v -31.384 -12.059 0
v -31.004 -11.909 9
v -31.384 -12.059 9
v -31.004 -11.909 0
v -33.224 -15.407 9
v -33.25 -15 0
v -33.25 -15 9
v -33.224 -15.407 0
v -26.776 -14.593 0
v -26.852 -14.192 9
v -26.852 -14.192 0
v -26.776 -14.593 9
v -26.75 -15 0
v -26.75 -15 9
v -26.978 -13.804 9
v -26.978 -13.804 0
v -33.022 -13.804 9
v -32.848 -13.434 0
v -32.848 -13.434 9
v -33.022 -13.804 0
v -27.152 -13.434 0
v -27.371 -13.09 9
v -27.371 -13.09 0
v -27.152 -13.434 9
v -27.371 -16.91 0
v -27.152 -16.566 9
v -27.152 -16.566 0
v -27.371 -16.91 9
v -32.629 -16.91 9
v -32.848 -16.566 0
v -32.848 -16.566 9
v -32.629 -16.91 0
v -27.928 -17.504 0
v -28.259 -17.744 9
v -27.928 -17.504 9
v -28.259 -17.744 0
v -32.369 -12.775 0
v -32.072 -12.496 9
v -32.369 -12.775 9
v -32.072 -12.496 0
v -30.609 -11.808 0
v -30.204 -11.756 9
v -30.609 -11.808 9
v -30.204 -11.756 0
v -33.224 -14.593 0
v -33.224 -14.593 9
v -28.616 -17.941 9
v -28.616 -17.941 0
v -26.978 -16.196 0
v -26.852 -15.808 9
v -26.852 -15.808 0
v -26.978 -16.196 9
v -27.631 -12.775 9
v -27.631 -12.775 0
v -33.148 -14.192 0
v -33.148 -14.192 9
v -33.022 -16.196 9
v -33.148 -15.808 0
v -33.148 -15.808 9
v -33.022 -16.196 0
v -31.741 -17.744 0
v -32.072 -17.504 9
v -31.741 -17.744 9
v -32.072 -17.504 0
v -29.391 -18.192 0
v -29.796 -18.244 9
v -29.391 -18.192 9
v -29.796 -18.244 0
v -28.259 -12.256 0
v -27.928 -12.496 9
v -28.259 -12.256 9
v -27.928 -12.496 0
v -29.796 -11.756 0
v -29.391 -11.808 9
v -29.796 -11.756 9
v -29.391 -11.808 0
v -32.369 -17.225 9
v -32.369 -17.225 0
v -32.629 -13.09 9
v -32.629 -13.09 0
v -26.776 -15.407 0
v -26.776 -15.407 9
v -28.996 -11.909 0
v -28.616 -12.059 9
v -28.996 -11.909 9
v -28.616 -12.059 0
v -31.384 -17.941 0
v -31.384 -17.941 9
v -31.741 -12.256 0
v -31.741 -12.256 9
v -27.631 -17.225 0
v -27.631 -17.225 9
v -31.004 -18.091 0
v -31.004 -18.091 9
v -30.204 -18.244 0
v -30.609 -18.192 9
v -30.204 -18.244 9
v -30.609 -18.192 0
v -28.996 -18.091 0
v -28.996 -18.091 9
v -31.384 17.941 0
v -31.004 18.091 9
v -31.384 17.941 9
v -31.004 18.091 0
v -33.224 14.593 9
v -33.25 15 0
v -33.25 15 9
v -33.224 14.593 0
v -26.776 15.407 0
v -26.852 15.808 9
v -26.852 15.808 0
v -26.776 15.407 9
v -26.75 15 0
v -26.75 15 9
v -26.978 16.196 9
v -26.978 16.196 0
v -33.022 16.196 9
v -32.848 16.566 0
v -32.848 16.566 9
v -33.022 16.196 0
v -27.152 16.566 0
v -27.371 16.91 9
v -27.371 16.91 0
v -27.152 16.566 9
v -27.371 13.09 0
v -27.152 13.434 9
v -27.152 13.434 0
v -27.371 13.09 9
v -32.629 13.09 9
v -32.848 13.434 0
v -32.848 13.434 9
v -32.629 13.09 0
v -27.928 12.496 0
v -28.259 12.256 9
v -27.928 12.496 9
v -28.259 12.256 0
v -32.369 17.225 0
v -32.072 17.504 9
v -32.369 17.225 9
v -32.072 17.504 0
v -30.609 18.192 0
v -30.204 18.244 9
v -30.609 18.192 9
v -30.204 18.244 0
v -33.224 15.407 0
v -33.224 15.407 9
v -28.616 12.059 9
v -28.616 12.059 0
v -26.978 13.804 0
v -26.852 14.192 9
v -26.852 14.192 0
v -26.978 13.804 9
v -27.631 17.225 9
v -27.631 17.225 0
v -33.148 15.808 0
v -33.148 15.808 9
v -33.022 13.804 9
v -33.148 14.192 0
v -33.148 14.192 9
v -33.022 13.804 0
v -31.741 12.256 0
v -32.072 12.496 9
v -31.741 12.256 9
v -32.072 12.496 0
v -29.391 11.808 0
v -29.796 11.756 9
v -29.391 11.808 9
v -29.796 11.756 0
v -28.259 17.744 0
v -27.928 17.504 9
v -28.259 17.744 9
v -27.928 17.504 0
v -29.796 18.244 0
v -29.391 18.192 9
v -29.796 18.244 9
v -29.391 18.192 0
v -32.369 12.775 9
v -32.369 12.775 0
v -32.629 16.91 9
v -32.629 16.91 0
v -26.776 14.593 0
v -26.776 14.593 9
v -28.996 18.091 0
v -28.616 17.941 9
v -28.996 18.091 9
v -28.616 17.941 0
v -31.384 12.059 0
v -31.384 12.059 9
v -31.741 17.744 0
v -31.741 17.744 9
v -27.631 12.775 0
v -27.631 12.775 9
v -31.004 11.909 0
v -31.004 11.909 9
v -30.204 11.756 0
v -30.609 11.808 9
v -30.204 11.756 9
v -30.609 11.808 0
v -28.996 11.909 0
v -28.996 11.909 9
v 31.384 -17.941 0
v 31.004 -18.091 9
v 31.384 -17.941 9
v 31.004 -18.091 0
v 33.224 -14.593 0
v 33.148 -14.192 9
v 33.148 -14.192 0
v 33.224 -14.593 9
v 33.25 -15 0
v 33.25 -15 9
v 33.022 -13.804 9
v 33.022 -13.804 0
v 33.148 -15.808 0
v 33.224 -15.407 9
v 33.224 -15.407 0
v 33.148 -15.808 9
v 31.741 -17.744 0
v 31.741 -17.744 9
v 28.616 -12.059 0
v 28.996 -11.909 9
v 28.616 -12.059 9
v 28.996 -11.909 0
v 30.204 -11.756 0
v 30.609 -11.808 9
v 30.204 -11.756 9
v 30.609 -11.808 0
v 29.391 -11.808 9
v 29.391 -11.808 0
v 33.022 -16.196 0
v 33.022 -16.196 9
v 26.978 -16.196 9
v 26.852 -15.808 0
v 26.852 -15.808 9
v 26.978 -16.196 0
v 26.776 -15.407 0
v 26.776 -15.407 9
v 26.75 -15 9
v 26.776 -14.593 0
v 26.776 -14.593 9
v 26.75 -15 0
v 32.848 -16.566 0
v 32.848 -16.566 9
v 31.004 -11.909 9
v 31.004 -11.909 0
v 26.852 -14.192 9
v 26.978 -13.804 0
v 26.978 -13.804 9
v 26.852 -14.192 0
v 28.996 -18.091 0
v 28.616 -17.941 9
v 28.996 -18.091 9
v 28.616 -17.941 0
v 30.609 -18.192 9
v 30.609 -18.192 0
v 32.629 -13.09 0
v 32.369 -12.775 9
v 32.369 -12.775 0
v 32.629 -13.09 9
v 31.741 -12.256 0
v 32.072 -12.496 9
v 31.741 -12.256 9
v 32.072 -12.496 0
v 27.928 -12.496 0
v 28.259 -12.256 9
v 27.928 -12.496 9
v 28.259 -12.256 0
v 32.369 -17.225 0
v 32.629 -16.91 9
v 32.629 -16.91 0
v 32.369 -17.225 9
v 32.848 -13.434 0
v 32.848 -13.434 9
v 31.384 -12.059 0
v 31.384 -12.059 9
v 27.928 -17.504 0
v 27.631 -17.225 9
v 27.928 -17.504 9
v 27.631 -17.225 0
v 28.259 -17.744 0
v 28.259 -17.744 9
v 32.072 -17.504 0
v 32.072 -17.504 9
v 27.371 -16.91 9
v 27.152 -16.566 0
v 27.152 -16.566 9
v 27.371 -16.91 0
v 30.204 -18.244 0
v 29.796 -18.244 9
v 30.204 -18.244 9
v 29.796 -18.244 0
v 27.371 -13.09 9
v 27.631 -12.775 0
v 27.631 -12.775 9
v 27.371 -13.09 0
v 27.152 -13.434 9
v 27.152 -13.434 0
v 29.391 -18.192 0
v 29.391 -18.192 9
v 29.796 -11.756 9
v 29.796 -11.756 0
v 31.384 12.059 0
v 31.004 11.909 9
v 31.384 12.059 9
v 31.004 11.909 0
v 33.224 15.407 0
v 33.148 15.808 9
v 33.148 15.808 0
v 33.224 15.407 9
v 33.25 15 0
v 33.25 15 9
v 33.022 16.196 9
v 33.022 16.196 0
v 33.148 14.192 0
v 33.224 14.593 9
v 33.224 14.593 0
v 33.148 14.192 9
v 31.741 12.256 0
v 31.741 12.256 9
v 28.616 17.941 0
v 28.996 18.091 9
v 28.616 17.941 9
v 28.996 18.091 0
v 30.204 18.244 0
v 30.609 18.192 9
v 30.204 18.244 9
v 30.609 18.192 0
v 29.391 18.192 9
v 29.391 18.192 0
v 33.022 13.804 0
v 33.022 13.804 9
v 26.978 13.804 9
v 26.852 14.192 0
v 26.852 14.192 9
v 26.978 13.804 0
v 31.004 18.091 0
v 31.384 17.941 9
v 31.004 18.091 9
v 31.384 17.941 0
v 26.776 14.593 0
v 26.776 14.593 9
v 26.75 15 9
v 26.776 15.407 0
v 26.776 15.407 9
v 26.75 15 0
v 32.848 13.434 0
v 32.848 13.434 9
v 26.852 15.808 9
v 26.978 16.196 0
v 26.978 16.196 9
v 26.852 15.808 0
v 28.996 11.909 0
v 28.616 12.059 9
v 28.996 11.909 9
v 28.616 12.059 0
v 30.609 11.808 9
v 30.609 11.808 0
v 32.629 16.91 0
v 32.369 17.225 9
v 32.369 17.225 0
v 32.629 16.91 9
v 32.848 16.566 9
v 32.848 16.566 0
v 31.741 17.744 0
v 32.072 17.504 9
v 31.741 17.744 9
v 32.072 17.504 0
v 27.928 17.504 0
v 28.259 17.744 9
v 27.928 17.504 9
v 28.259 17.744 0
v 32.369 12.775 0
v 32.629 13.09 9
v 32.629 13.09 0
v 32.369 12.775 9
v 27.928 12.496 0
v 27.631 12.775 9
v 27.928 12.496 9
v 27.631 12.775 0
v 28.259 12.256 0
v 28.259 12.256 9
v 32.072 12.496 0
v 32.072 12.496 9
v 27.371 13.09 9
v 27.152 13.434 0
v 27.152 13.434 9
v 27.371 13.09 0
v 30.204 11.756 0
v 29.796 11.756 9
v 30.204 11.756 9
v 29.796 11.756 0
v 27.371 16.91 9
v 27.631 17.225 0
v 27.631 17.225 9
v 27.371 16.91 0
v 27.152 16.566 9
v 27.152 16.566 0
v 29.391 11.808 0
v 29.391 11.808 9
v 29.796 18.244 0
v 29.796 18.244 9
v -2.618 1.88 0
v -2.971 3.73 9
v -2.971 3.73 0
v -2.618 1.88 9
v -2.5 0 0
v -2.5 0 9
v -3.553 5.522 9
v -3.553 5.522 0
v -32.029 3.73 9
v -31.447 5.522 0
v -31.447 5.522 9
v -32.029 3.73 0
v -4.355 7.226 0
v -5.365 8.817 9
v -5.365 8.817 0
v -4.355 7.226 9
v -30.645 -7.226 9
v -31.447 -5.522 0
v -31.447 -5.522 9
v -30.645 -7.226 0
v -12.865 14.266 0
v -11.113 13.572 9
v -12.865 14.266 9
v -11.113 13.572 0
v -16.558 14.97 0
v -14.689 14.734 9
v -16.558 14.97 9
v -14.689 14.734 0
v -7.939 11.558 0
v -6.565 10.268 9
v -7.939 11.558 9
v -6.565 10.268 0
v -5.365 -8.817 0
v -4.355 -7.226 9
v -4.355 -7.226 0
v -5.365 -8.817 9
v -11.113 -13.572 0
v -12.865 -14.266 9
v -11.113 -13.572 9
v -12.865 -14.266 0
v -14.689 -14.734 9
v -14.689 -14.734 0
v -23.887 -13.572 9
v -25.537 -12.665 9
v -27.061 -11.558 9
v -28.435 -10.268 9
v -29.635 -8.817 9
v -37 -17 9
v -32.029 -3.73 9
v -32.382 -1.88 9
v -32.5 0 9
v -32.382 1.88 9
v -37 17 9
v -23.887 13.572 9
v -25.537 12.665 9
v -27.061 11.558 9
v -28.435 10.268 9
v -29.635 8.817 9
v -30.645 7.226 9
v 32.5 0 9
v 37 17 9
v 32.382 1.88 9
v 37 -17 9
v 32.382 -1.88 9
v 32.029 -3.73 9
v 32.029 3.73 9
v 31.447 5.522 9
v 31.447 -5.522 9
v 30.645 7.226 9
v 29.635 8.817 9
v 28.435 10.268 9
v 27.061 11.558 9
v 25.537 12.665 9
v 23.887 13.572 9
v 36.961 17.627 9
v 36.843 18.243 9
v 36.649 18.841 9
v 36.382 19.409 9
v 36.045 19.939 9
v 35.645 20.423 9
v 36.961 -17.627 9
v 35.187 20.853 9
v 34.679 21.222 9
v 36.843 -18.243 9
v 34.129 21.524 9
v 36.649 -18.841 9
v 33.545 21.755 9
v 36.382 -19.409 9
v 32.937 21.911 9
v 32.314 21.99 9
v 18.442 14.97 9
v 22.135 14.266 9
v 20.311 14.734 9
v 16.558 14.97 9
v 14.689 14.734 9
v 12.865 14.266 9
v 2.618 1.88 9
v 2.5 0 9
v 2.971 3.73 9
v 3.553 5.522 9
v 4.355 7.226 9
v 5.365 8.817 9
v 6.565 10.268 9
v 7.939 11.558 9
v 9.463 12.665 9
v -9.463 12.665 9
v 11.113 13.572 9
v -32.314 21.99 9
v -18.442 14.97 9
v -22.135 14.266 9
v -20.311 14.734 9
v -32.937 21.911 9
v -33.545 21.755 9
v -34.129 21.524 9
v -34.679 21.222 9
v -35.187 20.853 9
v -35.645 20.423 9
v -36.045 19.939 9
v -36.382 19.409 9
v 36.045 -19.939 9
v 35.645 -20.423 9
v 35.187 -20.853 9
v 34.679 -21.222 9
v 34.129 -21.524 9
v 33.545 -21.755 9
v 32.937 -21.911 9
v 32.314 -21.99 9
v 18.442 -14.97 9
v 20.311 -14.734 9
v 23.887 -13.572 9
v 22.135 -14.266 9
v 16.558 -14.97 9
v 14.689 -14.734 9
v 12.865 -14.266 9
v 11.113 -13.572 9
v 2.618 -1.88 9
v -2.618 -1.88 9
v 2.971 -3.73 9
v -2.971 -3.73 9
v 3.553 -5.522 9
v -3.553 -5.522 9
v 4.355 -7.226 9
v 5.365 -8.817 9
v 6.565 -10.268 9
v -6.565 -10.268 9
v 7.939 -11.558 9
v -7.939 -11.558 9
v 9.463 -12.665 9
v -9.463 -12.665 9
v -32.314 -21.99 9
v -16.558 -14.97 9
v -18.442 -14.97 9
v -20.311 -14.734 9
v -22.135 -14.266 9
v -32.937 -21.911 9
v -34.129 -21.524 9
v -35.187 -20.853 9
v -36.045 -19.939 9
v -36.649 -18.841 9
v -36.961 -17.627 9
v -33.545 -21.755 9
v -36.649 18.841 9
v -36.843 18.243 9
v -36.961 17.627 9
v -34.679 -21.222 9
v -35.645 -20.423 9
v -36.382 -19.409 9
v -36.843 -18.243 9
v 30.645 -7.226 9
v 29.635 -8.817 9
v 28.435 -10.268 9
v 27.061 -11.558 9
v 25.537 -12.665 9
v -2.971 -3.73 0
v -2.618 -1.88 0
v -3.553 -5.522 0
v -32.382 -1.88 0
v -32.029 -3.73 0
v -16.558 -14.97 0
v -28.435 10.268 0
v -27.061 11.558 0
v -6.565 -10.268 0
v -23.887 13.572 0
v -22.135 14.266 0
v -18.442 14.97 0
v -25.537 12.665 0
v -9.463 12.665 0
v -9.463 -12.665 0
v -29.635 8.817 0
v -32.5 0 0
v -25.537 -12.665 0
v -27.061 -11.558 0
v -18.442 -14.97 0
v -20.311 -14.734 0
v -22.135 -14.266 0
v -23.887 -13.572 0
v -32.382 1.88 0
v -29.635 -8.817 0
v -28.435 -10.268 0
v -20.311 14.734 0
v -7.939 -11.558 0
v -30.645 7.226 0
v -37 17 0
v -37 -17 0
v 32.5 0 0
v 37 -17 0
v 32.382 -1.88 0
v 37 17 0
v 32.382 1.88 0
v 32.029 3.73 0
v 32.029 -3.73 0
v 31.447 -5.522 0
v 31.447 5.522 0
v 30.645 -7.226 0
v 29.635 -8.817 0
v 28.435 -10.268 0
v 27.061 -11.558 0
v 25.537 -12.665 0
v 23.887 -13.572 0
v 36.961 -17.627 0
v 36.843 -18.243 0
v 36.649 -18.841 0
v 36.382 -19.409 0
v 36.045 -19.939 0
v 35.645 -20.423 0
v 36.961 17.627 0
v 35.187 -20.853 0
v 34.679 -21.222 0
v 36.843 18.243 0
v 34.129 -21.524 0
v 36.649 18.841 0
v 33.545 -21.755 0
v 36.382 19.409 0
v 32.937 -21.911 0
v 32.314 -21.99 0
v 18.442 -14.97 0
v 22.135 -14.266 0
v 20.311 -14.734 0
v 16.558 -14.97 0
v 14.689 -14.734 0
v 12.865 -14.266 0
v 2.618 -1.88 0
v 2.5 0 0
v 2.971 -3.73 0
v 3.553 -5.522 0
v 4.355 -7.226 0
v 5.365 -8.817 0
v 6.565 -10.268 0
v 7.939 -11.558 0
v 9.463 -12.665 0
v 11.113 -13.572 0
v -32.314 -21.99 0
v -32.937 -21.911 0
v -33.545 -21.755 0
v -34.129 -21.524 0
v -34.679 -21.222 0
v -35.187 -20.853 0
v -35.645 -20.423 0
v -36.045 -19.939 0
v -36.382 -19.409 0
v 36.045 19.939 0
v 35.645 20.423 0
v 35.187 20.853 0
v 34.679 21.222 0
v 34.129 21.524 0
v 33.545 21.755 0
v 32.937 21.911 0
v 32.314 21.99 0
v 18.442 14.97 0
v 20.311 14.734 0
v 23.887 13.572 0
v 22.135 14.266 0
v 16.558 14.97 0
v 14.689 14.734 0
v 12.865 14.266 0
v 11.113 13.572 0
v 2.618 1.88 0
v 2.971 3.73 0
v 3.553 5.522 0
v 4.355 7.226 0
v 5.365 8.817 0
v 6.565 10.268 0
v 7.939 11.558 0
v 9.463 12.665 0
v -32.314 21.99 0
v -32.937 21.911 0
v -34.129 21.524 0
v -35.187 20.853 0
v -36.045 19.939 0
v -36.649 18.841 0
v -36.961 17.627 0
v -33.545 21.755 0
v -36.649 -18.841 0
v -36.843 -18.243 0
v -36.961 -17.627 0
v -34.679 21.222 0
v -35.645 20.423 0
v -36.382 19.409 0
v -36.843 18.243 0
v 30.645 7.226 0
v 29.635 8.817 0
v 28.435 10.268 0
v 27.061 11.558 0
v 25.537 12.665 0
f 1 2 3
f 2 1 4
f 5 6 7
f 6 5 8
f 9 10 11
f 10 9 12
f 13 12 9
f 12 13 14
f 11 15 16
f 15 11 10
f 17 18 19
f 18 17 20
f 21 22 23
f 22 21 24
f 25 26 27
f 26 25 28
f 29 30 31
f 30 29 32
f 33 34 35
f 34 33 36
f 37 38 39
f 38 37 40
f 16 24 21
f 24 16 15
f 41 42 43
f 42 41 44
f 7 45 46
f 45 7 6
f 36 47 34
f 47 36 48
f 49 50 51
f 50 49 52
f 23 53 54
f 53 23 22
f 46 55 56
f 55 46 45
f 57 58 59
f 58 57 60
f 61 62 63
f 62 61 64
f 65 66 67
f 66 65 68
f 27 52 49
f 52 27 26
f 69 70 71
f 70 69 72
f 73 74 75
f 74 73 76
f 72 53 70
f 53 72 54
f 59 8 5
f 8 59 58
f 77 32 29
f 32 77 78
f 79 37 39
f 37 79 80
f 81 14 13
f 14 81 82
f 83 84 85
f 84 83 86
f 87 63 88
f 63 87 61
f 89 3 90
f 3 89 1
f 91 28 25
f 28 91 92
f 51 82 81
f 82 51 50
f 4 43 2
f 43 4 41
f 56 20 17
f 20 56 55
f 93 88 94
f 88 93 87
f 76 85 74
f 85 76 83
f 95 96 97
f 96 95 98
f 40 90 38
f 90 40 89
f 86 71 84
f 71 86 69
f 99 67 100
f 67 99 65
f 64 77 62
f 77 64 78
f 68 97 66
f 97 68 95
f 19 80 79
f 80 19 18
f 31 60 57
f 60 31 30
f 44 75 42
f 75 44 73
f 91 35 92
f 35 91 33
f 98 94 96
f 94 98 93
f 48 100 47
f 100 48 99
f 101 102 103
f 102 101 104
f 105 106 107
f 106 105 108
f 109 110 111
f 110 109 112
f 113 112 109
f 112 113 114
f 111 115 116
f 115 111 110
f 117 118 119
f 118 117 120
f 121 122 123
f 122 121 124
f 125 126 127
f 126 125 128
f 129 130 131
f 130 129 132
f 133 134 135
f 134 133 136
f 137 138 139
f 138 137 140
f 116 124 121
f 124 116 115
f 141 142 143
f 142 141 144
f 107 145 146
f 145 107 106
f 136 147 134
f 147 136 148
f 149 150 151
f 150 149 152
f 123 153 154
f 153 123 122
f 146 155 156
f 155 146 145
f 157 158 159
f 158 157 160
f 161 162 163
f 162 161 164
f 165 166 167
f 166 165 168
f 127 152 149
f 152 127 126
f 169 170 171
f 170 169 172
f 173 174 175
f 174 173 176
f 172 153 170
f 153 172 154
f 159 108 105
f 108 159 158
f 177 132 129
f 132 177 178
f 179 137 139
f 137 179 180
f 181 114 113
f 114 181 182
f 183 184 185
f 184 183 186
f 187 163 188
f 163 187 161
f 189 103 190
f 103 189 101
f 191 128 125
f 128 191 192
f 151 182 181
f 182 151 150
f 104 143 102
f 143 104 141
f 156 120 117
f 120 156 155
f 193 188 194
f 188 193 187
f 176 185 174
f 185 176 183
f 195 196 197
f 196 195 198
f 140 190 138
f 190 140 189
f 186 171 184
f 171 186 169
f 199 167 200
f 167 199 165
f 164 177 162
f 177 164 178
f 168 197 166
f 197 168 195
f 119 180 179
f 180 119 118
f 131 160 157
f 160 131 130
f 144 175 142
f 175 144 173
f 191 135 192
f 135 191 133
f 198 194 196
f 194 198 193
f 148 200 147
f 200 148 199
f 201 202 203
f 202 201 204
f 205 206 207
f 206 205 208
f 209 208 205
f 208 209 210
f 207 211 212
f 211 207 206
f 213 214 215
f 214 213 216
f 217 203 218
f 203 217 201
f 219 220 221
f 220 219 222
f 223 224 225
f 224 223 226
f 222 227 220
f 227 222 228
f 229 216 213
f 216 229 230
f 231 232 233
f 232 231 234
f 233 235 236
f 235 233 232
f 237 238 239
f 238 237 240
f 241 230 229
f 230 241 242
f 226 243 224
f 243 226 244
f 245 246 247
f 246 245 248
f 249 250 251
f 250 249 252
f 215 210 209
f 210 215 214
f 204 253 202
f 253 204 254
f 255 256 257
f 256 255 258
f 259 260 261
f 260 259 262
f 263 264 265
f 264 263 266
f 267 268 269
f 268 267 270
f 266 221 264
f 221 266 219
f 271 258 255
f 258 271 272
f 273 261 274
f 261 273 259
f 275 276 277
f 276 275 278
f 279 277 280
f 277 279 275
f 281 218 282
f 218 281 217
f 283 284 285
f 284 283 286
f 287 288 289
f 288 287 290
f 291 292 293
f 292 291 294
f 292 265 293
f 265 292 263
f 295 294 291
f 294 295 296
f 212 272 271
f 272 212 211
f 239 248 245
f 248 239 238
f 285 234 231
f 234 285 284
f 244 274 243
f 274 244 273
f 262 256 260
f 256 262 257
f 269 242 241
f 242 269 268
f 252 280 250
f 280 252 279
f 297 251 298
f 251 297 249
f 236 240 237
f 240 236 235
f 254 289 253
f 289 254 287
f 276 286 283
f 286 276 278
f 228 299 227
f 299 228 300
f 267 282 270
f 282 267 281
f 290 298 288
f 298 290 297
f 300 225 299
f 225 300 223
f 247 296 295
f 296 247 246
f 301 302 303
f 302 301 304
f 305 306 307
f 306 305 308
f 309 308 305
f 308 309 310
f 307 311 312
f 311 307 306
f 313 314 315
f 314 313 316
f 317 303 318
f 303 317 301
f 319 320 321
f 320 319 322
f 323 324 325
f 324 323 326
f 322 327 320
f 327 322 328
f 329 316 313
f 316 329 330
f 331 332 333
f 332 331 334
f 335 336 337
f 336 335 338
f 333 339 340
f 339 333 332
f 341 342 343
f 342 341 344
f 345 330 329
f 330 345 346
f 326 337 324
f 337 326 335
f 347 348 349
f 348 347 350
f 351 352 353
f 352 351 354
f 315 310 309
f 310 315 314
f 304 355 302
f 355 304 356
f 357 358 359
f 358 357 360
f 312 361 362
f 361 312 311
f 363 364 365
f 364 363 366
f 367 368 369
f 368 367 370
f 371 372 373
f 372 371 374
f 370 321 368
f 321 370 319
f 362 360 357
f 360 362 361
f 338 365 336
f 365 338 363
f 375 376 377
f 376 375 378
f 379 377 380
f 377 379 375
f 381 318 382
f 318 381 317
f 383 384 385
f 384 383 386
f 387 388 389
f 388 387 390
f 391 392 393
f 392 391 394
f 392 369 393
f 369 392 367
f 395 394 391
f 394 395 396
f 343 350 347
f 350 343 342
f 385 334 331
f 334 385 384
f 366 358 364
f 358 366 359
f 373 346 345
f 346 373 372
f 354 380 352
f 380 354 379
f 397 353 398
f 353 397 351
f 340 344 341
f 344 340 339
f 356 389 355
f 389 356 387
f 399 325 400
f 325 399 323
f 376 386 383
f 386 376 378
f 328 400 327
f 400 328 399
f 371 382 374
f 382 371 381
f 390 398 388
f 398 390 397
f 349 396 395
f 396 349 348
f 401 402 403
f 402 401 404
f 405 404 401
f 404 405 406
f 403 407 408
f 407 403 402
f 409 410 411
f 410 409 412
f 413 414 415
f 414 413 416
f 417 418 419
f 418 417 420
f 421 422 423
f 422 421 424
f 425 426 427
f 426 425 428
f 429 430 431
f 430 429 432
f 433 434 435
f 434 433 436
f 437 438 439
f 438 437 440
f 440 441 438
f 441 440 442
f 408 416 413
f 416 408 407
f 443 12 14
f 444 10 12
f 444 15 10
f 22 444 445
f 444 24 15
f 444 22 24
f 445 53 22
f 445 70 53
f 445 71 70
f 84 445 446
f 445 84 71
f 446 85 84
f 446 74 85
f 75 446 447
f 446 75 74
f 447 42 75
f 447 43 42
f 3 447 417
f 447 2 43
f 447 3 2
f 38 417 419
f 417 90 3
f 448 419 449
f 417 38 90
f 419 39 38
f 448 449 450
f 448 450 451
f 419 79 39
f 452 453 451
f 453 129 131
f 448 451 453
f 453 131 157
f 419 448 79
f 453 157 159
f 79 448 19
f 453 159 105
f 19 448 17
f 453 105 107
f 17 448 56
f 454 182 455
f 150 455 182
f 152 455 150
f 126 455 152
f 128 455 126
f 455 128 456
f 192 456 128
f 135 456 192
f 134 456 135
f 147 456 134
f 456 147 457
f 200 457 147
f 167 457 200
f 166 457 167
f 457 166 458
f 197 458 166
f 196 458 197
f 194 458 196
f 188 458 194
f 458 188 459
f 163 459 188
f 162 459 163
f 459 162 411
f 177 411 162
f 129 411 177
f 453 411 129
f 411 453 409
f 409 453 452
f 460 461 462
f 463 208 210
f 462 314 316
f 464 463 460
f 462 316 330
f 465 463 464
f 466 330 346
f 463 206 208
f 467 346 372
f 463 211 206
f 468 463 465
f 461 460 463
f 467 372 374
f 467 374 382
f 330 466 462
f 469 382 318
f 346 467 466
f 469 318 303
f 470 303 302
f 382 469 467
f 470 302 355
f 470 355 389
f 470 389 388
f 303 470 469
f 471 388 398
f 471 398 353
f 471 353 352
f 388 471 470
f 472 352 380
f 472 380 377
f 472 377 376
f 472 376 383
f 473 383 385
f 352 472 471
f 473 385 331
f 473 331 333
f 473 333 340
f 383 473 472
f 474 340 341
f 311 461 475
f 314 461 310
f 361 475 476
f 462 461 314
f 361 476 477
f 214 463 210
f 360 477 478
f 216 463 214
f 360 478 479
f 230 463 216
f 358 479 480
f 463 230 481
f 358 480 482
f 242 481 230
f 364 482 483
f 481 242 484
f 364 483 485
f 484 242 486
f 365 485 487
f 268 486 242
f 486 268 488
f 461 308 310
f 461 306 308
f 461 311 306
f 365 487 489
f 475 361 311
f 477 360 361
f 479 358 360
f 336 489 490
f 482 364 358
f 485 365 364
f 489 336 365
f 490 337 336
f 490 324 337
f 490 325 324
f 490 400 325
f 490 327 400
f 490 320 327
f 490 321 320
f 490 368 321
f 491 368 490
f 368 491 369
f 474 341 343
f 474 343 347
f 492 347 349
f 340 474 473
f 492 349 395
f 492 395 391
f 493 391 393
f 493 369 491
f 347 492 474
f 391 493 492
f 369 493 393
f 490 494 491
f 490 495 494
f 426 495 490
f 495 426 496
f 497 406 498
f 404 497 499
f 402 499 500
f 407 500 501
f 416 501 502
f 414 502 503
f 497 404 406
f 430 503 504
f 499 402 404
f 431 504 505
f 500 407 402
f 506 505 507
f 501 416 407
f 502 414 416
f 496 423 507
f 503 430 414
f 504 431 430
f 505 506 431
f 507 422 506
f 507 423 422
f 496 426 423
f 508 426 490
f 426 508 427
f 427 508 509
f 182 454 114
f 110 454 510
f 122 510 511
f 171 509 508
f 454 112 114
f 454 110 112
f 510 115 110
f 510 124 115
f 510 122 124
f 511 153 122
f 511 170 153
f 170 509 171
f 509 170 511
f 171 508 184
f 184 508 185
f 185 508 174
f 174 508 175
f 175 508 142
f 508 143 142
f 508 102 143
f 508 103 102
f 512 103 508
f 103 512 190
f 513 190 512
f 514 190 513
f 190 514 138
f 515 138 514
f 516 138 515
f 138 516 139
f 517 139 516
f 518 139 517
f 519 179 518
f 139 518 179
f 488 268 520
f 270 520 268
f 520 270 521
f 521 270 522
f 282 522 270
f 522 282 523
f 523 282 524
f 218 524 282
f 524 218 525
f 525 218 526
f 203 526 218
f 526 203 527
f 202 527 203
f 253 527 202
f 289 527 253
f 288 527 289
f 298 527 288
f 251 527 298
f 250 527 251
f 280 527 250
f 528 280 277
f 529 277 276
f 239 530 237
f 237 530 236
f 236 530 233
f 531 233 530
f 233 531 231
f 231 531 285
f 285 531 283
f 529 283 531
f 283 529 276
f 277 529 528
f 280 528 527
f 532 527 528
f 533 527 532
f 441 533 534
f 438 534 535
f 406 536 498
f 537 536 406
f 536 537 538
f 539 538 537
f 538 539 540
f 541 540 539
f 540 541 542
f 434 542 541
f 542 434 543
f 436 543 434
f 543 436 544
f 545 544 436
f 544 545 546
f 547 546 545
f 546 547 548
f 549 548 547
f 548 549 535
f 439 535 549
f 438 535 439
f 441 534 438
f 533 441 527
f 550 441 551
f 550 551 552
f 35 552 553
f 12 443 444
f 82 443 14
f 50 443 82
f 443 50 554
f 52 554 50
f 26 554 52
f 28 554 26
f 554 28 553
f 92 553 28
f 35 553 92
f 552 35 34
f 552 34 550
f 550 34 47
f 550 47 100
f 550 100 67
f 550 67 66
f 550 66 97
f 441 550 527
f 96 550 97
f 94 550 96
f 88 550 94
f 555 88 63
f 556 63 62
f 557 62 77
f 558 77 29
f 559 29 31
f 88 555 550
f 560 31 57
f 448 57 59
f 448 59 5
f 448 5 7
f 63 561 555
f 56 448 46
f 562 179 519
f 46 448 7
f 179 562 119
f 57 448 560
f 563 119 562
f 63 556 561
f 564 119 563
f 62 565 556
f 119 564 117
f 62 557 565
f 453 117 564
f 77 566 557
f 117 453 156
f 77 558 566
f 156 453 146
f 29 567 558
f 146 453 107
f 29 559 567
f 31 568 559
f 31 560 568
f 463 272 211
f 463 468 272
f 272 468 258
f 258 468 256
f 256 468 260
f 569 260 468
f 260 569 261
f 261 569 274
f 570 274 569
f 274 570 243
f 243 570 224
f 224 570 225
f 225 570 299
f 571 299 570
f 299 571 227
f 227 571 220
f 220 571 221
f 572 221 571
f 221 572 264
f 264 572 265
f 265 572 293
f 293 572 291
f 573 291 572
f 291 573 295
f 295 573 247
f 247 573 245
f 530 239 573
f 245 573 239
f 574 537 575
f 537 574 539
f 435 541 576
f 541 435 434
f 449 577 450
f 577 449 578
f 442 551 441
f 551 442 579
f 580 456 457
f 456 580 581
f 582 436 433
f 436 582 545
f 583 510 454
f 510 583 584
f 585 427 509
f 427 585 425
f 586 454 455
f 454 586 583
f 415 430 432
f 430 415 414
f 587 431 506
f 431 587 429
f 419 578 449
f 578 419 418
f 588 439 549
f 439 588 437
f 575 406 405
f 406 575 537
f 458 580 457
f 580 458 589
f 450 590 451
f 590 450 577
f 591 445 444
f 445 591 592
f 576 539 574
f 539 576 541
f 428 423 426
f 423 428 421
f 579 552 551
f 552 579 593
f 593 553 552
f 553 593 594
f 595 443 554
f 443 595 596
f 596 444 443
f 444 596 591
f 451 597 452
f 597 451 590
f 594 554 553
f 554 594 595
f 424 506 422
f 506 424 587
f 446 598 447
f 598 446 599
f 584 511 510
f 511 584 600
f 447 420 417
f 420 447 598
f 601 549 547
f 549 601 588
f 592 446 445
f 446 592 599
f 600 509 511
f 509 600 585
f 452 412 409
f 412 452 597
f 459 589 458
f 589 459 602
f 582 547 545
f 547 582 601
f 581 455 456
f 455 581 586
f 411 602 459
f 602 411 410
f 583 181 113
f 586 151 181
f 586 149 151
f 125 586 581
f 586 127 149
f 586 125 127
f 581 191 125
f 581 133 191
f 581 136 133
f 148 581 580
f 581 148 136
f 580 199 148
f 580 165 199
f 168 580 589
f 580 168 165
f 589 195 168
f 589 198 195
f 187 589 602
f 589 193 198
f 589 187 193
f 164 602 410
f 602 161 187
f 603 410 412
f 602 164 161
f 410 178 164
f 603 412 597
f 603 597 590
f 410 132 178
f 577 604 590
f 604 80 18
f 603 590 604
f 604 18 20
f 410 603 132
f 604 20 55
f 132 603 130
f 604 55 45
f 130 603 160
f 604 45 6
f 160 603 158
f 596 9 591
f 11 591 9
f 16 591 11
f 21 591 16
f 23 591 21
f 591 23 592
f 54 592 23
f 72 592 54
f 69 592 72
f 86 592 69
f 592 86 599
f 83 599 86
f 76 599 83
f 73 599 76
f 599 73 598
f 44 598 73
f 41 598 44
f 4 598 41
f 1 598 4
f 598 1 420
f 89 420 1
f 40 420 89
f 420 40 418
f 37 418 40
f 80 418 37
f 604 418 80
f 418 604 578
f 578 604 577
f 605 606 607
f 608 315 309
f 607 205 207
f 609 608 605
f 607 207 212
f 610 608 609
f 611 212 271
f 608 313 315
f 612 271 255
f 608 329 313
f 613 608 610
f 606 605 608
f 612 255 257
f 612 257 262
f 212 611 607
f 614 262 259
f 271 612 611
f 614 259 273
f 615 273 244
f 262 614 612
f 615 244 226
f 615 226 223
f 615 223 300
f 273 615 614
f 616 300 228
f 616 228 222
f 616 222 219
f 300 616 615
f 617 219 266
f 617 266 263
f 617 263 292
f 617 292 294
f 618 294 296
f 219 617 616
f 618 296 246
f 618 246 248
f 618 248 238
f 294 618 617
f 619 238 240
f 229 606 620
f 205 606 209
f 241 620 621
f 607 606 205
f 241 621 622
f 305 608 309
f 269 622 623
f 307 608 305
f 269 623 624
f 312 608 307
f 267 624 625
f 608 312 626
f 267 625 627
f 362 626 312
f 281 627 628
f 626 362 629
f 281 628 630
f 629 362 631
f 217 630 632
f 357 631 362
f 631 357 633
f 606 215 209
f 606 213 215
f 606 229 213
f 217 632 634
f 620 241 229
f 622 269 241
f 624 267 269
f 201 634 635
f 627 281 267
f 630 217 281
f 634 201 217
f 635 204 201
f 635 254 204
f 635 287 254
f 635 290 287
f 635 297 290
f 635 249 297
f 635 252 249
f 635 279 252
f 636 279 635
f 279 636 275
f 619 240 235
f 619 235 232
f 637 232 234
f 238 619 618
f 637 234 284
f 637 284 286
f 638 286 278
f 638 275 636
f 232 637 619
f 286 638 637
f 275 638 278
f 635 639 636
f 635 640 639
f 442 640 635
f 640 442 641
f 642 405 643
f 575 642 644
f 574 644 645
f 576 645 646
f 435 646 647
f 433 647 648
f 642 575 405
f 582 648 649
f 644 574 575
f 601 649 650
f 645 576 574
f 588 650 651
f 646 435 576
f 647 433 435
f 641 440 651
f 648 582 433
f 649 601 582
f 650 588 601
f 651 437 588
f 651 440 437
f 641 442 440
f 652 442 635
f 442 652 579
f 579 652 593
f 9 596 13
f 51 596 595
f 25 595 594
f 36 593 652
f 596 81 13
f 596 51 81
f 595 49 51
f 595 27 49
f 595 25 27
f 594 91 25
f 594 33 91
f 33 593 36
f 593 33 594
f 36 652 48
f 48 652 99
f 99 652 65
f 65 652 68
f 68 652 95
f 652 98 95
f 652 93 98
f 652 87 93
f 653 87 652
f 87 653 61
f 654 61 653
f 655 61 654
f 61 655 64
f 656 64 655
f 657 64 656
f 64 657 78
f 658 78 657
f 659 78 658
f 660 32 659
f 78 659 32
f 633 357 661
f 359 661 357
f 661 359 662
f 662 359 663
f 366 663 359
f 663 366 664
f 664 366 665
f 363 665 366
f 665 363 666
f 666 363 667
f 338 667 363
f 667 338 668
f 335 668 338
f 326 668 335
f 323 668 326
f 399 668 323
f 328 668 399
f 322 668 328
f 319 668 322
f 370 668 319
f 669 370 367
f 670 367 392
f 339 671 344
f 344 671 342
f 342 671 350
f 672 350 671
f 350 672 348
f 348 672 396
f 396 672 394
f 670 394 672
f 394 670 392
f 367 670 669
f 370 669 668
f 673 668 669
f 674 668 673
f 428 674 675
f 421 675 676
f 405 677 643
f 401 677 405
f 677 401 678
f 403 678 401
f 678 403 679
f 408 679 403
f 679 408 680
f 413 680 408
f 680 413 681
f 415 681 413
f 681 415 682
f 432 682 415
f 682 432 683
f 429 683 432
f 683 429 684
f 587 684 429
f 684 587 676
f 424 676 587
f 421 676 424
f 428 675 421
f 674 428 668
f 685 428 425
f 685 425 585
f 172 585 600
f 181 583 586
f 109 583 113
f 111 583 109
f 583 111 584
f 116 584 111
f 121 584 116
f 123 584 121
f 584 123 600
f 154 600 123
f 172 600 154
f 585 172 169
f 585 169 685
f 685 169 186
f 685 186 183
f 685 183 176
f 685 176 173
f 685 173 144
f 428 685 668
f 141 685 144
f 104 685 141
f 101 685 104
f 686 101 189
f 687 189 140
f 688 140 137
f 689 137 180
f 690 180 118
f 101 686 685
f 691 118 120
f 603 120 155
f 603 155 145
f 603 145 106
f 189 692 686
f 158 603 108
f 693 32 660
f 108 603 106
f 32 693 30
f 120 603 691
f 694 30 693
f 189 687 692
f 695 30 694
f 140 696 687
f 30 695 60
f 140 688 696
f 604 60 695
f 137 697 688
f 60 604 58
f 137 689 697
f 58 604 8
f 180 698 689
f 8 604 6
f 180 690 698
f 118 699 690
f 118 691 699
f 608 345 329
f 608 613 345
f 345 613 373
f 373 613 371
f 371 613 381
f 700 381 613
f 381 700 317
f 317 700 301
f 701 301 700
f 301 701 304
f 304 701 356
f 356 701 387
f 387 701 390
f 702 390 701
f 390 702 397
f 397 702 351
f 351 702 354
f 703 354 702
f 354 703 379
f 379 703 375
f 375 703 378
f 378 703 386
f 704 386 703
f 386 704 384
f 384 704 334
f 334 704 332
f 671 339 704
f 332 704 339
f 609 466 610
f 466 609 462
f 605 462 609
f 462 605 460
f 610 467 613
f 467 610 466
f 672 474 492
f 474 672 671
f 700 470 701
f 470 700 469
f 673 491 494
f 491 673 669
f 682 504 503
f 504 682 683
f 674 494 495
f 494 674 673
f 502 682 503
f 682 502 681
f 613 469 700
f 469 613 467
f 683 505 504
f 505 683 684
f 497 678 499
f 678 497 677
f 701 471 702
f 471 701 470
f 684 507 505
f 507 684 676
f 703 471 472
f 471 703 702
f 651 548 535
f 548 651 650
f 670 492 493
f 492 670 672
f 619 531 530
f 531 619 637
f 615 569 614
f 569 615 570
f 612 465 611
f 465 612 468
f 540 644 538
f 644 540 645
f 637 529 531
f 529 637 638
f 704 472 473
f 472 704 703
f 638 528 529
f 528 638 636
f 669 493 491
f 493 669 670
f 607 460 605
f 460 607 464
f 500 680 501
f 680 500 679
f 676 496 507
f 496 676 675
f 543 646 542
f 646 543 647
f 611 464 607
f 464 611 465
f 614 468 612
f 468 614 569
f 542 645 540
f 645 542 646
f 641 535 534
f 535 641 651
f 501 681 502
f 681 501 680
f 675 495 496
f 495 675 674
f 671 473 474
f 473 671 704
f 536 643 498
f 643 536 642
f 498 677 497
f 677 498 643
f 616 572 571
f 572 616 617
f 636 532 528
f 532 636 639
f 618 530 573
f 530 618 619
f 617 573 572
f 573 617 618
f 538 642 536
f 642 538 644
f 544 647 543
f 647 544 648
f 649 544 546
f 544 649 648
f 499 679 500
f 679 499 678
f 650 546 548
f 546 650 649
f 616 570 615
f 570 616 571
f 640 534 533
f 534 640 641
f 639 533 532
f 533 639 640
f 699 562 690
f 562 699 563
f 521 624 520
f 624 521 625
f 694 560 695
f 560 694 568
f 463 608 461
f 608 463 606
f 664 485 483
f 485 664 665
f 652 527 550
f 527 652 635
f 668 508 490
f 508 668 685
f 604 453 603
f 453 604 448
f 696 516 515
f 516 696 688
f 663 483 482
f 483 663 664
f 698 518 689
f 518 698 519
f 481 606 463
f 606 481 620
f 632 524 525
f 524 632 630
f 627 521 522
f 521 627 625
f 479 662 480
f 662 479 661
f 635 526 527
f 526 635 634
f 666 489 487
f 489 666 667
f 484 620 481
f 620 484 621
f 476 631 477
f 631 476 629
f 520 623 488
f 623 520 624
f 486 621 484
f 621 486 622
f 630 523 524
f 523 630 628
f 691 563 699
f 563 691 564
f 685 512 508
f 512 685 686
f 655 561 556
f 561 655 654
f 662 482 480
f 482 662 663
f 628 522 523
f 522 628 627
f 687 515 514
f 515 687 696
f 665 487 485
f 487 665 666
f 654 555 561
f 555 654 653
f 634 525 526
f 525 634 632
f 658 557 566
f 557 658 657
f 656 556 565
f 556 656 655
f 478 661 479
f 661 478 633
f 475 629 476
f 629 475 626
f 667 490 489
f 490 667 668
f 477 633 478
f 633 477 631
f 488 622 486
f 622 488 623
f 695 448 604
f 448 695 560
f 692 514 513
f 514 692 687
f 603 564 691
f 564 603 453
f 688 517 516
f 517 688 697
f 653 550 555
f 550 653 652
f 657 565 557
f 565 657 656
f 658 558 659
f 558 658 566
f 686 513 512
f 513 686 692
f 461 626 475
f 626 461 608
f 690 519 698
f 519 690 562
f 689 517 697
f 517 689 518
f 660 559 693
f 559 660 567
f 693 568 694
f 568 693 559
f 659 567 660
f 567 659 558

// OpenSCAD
$fn = 50;

difference() {
	union() {
		hull() {
			translate(v = [-32.0, 17.0, 0]) {
				cylinder(h = 9, r = 5);
			}
			translate(v = [32.0, 17.0, 0]) {
				cylinder(h = 9, r = 5);
			}
			translate(v = [-32.0, -17.0, 0]) {
				cylinder(h = 9, r = 5);
			}
			translate(v = [32.0, -17.0, 0]) {
				cylinder(h = 9, r = 5);
			}
		}
	}
	union() {
		translate(v = [-30.0, -15.0, -100.0]) {
			cylinder(h = 200, r = 3.25);
		}
		translate(v = [-30.0, 15.0, -100.0]) {
			cylinder(h = 200, r = 3.25);
		}
		translate(v = [30.0, -15.0, -100.0]) {
			cylinder(h = 200, r = 3.25);
		}
		translate(v = [30.0, 15.0, -100.0]) {
			cylinder(h = 200, r = 3.25);
		}
		translate(v = [-30.0, -15.0, -100.0]) {
			cylinder(h = 200, r = 1.8);
		}
		translate(v = [-30.0, 15.0, -100.0]) {
			cylinder(h = 200, r = 1.8);
		}
		translate(v = [30.0, -15.0, -100.0]) {
			cylinder(h = 200, r = 1.8);
		}
		translate(v = [30.0, 15.0, -100.0]) {
			cylinder(h = 200, r = 1.8);
		}
		translate(v = [-17.5, 0, 0.0]) {
			cylinder(h = 9, r = 15.0);
		}
		translate(v = [17.5, 0, 0.0]) {
			cylinder(h = 9, r = 15.0);
		}
	}
}
